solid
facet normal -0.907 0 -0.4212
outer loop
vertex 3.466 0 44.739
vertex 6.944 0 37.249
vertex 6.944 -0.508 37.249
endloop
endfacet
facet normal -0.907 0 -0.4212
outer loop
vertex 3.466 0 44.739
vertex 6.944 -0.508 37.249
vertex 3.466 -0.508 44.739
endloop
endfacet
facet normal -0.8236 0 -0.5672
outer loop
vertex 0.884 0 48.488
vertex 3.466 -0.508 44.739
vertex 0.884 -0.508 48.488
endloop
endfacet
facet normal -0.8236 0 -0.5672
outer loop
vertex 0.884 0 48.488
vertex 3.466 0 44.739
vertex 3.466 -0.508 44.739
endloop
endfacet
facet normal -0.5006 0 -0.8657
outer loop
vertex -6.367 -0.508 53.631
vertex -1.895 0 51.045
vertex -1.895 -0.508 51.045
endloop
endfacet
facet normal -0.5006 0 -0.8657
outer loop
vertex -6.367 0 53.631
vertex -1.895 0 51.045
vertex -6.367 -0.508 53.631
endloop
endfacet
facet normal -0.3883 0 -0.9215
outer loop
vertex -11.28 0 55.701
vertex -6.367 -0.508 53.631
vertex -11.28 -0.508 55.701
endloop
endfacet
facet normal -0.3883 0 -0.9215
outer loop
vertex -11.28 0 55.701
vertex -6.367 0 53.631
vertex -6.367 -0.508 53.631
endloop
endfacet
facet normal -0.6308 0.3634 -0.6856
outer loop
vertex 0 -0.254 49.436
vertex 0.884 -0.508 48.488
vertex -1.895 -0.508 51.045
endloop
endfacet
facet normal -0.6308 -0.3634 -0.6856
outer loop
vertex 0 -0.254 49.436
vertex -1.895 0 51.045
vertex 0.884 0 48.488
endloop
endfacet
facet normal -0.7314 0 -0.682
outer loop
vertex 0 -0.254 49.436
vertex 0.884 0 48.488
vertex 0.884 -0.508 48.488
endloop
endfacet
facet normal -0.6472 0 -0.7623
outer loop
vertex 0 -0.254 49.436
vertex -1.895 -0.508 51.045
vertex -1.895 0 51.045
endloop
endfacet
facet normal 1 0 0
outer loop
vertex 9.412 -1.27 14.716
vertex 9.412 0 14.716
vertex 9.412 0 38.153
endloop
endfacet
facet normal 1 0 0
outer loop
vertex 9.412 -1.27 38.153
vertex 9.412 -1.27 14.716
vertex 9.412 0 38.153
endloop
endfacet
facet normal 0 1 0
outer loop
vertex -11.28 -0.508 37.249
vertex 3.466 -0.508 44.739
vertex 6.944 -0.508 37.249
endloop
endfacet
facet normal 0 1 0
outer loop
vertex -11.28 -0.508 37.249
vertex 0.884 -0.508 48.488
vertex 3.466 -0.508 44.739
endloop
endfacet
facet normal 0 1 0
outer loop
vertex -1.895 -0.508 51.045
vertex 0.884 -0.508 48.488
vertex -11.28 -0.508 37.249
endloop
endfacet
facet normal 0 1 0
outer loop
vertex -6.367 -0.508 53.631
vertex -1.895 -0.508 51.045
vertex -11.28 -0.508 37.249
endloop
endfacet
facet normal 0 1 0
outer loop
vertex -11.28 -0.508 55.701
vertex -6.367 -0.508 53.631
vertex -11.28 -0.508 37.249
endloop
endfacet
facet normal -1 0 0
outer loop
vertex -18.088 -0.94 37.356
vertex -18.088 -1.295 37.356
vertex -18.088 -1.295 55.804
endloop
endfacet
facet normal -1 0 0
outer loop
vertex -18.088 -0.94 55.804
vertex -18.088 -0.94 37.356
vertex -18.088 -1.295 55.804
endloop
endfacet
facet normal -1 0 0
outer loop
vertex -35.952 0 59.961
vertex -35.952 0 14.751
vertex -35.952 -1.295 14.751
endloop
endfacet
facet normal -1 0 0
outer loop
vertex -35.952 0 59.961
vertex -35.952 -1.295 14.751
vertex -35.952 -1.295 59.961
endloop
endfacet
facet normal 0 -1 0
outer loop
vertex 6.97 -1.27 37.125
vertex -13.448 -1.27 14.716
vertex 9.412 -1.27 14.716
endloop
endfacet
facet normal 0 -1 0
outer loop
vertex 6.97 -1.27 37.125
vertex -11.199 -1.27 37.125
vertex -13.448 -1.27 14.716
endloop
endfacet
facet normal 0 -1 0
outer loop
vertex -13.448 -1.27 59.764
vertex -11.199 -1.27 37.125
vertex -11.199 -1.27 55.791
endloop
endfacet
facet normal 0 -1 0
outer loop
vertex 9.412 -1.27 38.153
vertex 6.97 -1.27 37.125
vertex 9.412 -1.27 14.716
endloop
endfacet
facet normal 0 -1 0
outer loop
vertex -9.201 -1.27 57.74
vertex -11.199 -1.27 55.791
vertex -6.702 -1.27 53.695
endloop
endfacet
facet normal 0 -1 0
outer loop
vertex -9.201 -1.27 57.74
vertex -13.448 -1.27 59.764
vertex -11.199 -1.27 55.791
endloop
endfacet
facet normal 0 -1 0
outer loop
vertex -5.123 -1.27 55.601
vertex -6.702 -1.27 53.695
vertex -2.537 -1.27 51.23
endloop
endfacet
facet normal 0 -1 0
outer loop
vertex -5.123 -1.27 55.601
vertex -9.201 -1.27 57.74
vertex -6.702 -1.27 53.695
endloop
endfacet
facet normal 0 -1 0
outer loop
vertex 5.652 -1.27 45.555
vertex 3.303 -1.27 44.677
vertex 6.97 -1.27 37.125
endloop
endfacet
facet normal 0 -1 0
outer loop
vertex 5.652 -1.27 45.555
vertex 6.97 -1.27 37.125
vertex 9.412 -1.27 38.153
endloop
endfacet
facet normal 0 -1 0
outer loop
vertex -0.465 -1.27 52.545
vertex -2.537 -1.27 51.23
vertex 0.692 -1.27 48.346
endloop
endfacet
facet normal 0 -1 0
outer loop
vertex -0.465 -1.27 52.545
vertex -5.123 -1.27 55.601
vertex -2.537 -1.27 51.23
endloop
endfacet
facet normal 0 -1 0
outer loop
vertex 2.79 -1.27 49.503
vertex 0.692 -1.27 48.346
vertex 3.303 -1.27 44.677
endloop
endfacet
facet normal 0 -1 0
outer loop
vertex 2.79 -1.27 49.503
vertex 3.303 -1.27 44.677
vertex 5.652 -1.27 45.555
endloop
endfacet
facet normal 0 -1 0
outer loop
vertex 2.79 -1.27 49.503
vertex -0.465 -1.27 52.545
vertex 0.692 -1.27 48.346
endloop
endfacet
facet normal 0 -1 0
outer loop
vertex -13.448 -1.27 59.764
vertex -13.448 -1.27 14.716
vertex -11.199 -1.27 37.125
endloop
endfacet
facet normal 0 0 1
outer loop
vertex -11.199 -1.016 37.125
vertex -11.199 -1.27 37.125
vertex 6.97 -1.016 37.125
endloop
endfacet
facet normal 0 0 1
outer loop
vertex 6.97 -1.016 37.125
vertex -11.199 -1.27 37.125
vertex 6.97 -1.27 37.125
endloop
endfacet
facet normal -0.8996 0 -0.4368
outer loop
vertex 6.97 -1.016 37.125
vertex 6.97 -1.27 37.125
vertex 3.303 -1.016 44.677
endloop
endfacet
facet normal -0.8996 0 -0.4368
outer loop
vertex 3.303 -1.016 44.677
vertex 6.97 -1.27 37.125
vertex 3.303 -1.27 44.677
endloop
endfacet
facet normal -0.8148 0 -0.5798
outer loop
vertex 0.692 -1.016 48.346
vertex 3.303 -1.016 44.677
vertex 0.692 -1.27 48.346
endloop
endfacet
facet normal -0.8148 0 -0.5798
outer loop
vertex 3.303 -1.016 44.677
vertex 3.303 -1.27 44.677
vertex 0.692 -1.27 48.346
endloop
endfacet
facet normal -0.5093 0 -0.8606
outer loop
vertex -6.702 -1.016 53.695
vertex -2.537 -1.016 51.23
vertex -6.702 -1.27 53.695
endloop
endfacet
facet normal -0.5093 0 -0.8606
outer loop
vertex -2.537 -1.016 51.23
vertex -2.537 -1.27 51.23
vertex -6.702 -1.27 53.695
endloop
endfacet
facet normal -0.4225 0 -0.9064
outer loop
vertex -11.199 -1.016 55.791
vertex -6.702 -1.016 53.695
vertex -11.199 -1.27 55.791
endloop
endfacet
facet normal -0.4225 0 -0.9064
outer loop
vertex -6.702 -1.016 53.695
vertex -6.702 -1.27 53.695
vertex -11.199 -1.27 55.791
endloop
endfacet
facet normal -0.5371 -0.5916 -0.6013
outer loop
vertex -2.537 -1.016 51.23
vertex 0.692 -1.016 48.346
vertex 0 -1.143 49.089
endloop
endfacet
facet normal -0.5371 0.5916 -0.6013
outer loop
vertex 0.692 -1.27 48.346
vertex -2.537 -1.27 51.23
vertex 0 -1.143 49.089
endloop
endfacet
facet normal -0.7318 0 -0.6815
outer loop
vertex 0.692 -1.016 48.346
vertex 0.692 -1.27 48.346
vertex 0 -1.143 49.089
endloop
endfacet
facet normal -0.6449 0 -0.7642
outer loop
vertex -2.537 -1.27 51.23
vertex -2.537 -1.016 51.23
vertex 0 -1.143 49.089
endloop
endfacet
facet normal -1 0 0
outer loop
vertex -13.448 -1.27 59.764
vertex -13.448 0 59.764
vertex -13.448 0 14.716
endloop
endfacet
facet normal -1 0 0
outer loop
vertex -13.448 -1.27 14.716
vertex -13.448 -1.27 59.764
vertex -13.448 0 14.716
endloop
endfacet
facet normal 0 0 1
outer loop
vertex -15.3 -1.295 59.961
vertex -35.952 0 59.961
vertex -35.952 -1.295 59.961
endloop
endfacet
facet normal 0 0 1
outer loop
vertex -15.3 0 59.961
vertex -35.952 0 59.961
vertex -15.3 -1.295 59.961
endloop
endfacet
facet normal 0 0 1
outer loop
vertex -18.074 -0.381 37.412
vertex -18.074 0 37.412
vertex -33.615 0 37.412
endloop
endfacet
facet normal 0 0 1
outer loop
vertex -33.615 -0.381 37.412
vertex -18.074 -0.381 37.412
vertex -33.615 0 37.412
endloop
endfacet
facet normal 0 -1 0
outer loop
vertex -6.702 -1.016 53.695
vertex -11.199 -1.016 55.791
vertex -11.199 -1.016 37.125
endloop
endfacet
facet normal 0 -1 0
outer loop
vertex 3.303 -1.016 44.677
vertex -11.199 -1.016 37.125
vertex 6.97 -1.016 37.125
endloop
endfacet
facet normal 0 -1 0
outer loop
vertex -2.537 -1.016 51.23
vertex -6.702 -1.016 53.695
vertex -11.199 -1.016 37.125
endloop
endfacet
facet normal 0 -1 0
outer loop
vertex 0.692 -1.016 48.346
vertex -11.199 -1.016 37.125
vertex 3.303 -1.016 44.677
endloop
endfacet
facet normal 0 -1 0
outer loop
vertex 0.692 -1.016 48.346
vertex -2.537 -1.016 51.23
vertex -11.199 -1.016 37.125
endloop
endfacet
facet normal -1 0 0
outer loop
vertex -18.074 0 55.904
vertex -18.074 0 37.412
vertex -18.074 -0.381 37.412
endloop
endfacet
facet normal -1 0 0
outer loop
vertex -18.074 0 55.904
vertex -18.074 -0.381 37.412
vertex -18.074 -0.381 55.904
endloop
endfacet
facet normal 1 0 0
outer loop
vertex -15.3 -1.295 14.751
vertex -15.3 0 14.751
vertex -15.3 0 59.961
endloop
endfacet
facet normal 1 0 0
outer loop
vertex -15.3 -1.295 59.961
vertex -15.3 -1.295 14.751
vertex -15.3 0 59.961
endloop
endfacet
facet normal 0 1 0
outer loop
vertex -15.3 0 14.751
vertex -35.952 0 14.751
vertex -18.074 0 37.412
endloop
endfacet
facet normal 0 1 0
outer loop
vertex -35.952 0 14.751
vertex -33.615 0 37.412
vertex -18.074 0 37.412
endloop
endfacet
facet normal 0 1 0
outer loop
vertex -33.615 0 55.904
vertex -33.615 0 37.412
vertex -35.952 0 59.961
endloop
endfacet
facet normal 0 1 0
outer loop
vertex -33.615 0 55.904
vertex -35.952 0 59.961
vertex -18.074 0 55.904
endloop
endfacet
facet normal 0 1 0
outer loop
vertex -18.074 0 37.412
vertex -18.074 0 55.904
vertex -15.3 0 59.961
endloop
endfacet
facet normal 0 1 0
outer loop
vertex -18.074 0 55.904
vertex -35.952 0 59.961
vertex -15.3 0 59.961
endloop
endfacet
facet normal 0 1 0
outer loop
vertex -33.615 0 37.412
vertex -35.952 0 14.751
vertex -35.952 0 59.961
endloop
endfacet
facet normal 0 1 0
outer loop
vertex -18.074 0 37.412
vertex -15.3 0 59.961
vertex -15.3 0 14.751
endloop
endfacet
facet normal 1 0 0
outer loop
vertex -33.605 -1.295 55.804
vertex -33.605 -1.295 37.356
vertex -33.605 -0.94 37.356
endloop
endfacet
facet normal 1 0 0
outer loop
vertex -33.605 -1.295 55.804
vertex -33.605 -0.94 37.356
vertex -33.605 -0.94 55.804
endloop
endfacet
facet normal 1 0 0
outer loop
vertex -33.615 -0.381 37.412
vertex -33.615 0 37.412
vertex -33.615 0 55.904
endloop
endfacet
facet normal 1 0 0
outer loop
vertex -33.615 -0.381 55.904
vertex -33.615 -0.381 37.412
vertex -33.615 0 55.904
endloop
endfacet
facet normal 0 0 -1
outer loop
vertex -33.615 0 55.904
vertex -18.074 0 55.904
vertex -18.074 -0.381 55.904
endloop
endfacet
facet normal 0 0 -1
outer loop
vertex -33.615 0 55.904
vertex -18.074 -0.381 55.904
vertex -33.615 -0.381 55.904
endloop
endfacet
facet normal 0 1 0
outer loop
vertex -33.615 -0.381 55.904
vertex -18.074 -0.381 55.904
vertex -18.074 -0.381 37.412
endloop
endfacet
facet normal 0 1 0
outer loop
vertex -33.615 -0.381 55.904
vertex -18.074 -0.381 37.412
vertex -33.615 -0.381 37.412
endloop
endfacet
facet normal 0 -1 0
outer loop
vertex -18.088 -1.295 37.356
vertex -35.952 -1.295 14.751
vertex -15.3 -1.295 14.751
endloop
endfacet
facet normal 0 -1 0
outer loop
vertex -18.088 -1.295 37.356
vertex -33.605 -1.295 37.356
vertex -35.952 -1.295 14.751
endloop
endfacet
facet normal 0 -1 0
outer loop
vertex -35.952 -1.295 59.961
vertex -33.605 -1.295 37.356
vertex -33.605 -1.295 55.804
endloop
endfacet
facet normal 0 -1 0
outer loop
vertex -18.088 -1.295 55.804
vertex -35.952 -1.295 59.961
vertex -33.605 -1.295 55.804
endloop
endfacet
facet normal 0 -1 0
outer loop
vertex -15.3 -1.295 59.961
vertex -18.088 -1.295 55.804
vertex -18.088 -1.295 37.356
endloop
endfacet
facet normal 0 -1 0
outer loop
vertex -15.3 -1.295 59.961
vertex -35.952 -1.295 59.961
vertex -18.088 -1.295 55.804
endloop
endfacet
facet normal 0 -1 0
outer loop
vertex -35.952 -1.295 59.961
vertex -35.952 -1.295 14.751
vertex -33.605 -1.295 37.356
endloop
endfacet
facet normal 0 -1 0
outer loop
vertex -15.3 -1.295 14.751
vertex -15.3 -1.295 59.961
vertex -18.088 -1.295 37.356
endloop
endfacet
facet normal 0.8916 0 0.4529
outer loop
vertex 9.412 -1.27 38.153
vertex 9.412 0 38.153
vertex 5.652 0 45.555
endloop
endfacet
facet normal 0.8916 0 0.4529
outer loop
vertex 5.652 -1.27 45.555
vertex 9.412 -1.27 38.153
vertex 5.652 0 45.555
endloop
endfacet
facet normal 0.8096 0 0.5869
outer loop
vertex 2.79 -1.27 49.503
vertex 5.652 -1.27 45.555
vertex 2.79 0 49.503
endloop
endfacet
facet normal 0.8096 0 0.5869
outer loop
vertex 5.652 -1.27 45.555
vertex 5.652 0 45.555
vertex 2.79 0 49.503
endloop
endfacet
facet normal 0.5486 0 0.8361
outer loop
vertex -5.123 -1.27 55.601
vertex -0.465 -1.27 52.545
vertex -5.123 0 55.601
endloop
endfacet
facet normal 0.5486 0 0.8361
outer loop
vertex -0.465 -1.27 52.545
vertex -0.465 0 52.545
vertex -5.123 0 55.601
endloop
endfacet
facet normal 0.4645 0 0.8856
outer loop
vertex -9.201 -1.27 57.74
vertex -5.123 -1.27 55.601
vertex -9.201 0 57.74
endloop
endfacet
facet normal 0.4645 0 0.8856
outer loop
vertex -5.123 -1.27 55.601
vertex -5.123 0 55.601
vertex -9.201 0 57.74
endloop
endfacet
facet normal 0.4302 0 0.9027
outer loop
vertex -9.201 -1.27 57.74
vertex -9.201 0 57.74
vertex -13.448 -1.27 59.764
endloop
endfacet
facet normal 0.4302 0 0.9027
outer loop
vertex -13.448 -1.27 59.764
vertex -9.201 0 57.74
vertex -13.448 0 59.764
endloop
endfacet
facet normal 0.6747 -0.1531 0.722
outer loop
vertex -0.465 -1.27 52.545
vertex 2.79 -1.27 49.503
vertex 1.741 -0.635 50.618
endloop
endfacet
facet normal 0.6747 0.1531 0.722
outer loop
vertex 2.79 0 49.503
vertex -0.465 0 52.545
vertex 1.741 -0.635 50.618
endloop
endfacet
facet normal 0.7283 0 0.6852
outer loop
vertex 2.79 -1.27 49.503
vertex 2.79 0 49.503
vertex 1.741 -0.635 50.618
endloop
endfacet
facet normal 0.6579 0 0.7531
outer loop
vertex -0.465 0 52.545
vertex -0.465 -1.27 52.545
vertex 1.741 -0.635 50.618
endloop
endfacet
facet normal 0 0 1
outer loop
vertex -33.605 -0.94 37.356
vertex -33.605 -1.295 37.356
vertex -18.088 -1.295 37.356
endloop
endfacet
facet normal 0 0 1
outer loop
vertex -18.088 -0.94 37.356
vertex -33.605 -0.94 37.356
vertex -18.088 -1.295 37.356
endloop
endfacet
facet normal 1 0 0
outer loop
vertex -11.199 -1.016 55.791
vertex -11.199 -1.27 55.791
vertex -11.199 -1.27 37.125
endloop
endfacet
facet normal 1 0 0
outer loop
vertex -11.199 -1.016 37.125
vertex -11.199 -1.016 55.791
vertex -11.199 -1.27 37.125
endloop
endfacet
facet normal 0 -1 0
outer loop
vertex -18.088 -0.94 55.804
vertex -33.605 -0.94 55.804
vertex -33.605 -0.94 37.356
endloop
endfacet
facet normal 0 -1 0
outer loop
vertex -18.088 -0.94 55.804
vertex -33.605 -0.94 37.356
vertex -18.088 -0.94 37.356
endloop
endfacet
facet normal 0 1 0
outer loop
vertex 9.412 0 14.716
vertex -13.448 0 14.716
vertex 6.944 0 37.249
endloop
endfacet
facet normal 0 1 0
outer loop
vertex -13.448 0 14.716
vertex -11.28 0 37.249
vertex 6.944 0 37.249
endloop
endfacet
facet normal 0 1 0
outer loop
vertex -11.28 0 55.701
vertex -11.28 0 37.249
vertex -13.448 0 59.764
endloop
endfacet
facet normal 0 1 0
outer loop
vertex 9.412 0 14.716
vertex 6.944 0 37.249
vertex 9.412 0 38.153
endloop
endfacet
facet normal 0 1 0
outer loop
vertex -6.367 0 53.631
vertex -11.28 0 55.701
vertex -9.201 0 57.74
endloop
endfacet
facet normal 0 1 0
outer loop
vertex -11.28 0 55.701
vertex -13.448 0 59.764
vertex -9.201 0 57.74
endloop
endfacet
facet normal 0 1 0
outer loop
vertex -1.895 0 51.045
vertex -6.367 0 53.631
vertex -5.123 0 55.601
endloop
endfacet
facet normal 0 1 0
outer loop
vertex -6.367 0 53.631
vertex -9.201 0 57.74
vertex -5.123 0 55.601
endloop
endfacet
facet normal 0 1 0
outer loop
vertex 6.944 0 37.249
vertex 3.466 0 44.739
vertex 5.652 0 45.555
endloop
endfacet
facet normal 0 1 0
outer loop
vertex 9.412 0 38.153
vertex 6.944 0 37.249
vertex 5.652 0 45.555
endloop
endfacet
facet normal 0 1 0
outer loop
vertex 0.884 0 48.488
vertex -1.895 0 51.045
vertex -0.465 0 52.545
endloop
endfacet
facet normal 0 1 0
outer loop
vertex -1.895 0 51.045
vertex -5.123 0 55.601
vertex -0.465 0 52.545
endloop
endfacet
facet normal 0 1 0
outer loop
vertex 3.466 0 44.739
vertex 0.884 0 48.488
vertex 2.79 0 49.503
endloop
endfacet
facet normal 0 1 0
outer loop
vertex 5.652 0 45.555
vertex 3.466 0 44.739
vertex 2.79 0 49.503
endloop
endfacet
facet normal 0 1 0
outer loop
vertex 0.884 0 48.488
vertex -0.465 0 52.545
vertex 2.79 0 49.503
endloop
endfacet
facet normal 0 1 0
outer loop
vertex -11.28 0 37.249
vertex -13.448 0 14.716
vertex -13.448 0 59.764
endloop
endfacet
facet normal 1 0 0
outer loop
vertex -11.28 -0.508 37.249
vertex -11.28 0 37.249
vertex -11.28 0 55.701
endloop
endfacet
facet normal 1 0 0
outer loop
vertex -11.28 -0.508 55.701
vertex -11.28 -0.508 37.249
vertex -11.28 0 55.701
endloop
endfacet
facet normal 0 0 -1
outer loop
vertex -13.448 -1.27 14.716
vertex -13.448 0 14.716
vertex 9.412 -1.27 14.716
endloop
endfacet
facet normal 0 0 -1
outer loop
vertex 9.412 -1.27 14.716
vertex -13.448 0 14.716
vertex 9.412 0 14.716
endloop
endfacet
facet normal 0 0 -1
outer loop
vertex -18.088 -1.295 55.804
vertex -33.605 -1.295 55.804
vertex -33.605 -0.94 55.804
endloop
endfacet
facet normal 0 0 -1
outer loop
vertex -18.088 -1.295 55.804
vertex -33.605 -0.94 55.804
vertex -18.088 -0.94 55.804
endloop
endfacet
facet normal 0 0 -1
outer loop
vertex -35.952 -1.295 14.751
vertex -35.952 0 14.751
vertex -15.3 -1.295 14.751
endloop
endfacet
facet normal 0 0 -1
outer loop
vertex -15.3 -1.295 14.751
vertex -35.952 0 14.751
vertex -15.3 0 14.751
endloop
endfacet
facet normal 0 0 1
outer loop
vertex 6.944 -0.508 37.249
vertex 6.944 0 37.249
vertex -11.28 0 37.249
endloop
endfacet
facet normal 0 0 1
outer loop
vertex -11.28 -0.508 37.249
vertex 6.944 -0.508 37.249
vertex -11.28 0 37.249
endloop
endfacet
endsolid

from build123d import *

# Parameters (mm, degrees)
F0_W      = 20.6513749436
F0_H      = 45.2097626403
F1_DEPTH  = 1.2954
F2_W      = 15.5173763633
F2_H      = 18.4473977424
F3_DEPTH  = 0.3556
F5_DEPTH  = 1.27
F7_DEPTH  = 0.254
F8_W      = 15.5410431325
F8_H      = 18.4918753803
F9_DEPTH  = 0.381
F11_DEPTH = 0.508


with BuildPart() as f1:
    # F0 (on Front) → F1 (new body)
    with BuildSketch(Plane.XZ):
        with Locations((-25.6260237657, 37.3561470769)):
            Rectangle(F0_W, F0_H)
    extrude(amount=F1_DEPTH)

    # F2 (on face) → F3 (cut)
    with BuildSketch(Plane.XZ.offset(1.2954)):
        with Locations((-25.8462056518, 46.5798459481)):
            Rectangle(F2_W, F2_H)
    extrude(amount=-F3_DEPTH, mode=Mode.SUBTRACT)

    # F8 (on face) → F9 (cut)
    with BuildSketch(Plane(origin=(0, 0, 0), x_dir=(-1, 0, 0), z_dir=(0, 1, 0))):
        with Locations((25.8446913213, 46.6582681984)):
            Rectangle(F8_W, F8_H)
    extrude(amount=-F9_DEPTH, mode=Mode.SUBTRACT)


with BuildPart() as f5:
    # F4 (on Front) → F5 (new body)
    with BuildSketch(Plane.XZ):
        with BuildLine():
            add(Edge.make_bspline(
                [(9.4122933224, 38.1533578038), (7.3415128605, 42.6377063389), (2.9915003574, 52.0578126972), (-7.7960400253, 57.1144170399), (-13.4482784197, 59.7638748586)],
                knots=[0, 0, 0, 0, 0.4760401172, 1, 1, 1, 1], degree=3))
            Line((-13.4482784197, 59.7638748586), (-13.4482784197, 14.7161055356))
            Line((-13.4482784197, 14.7161055356), (9.4122933224, 14.7161055356))
            Line((9.4122933224, 14.7161055356), (9.4122933224, 38.1533578038))
        make_face()
    extrude(amount=F5_DEPTH)

    # F6 (on face) → F7 (cut)
    with BuildSketch(Plane.XZ.offset(1.27)):
        with BuildLine():
            add(Edge.make_bspline(
                [(6.9700647146, 37.1249839664), (5.0327711758, 41.5409809715), (1.2146105452, 50.2443527487), (-7.1023339447, 53.9603098649), (-11.1993504688, 55.7908304036)],
                knots=[0, 0, 0, 0, 0.5073892186, 1, 1, 1, 1], degree=3))
            Line((-11.1993504688, 55.7908304036), (-11.1993504688, 37.1249839664))
            Line((-11.1993504688, 37.1249839664), (6.9700647146, 37.1249839664))
        make_face()
    extrude(amount=-F7_DEPTH, mode=Mode.SUBTRACT)

    # F10 (on face) → F11 (cut)
    with BuildSketch(Plane(origin=(0, 0, 0), x_dir=(-1, 0, 0), z_dir=(0, 1, 0))):
        with BuildLine():
            Line((11.2799312919, 37.2494496405), (11.2799312919, 55.7006895542))
            add(Edge.make_bspline(
                [(-6.9435159676, 37.2494496405), (-5.038828544, 41.7928932275), (-1.3073304569, 50.6940130879), (7.1429635524, 54.0551800354), (11.2799312919, 55.7006895542)],
                knots=[0, 0, 0, 0, 0.5104350529, 1, 1, 1, 1], degree=3))
            Line((-6.9435159676, 37.2494496405), (11.2799312919, 37.2494496405))
        make_face()
    extrude(amount=-F11_DEPTH, mode=Mode.SUBTRACT)


solid = Compound([f1.part, f5.part])
